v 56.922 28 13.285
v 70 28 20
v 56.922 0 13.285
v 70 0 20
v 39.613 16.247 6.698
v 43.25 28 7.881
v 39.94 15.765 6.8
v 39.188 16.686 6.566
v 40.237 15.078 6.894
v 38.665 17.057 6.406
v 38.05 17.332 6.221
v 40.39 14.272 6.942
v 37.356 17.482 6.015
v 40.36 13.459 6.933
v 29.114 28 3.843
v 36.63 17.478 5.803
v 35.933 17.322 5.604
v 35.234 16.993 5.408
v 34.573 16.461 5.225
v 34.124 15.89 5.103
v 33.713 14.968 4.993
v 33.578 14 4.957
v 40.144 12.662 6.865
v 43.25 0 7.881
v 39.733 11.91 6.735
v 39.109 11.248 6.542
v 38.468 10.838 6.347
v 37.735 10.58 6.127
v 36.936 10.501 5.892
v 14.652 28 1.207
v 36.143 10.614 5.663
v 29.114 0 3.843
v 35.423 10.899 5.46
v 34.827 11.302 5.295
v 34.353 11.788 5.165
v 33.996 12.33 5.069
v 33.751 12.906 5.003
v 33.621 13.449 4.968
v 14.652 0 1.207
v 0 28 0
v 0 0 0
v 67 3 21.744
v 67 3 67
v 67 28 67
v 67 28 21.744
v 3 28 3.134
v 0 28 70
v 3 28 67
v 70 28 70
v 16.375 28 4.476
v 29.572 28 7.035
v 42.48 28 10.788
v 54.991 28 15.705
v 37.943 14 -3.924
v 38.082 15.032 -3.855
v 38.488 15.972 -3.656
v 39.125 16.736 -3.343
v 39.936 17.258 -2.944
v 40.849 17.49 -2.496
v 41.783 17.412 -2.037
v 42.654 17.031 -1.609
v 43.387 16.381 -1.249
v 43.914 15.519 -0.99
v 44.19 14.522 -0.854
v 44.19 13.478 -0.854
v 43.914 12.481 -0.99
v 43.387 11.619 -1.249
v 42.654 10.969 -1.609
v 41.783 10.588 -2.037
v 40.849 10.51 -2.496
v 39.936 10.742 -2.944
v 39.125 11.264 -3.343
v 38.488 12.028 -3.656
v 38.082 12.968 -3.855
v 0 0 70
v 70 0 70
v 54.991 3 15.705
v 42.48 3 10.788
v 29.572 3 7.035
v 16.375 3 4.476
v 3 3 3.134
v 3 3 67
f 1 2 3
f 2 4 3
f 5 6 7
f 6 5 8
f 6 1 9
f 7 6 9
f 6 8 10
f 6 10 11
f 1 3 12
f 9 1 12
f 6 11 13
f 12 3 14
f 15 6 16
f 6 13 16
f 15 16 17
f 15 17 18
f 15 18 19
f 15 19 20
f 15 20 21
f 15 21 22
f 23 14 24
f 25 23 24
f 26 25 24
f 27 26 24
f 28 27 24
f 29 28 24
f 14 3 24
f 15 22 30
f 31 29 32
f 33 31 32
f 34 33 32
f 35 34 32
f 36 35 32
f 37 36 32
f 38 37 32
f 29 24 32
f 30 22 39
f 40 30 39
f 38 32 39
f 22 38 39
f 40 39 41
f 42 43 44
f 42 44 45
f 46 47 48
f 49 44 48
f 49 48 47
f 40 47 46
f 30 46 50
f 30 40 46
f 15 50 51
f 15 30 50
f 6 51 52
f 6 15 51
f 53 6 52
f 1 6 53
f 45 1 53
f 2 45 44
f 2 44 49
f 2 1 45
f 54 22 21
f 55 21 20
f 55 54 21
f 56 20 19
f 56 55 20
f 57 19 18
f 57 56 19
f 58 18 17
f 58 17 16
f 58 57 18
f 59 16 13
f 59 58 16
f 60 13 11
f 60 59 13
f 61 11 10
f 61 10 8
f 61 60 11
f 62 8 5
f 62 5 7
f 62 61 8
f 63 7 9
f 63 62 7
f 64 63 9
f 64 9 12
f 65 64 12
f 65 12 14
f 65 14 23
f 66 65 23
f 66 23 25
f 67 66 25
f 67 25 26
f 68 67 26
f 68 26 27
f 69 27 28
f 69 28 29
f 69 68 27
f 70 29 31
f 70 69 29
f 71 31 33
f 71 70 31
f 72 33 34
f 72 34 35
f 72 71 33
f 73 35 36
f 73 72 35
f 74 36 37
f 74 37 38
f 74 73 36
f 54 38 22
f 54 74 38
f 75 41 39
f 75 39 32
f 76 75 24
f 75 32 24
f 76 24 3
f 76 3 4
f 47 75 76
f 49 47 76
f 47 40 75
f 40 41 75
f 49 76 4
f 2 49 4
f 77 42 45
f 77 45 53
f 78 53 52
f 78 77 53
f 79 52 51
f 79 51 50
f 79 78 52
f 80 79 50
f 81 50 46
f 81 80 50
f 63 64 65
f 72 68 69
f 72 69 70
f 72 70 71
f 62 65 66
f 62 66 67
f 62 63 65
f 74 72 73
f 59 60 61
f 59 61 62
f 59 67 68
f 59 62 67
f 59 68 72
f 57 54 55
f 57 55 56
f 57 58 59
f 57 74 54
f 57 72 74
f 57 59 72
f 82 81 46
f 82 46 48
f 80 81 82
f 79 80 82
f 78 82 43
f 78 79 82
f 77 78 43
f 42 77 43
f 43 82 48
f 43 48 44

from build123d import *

# Parameters (mm, degrees)
BOSS_EXTRUDE2_DEPTH             = 3
BOSS_EXTRUDE3_DEPTH             = 25
SKETCH11_R                      = 3.5
BOSS_EXTRUDE5_DEPTH             = 7
BOSS_EXTRUDE5_DIRECTION_2_REACH = 85.256


with BuildPart() as part:
    # Sketch1 → Boss-Extrude2 (new body)
    with BuildSketch(Plane(origin=(0, 0, 0), x_dir=(1, 0, 0), z_dir=(0, 1, 0))):
        with BuildLine():
            Line((0, 0), (0, -70))
            Line((0, -70), (70, -70))
            Line((70, -70), (70, -20))
            ThreePointArc((70, -20), (36.231761047, -5.688836334), (0, 0))
        make_face()
    extrude(amount=BOSS_EXTRUDE2_DEPTH)

    # Sketch3 → Boss-Extrude3 (add)
    with BuildSketch(Plane(origin=(0, 3, 0), x_dir=(1, 0, 0), z_dir=(0, 1, 0))):
        with BuildLine():
            Line((70, -70), (70, -20))
            ThreePointArc((70, -20), (36.231761047, -5.688836334), (0, 0))
            Line((0, 0), (0, -70))
            Line((0, -70), (70, -70))
        make_face()
        with BuildLine():
            Line((3, -3.133993062), (3, -67))
            Line((3, -67), (67, -67))
            Line((67, -67), (67, -21.744121307))
            ThreePointArc((67, -21.744121307), (36.068657655, -8.763956776), (3, -3.133993062))
        make_face(mode=Mode.SUBTRACT)
    extrude(amount=BOSS_EXTRUDE3_DEPTH)

    # Sketch11 → Boss-Extrude5 (add)
    with BuildSketch(Plane(origin=(61.178699811, 14, 15.293872991), x_dir=(-0.8974903699241337, 0, -0.4410340529862085), z_dir=(0.4410340529862085, 0, -0.8974903699241337))):
        with Locations((25.829909239, 0)):
            Circle(SKETCH11_R)
    extrude(amount=BOSS_EXTRUDE5_DEPTH)

    # Sketch11 → Boss-Extrude5 direction 2 (add, up to next)
    with BuildSketch(Plane(origin=(61.178699811, 14, 15.293872991), x_dir=(-0.8974903699241337, 0, -0.4410340529862085), z_dir=(0.4410340529862085, 0, -0.8974903699241337)), mode=Mode.PRIVATE) as boss_extrude5_direction_2_sk1:
        with Locations((25.829909239, 0)):
            Circle(SKETCH11_R)
    boss_extrude5_direction_2_tool1 = extrude(boss_extrude5_direction_2_sk1.sketch, amount=-BOSS_EXTRUDE5_DIRECTION_2_REACH, mode=Mode.PRIVATE) - part.part
    add(boss_extrude5_direction_2_tool1.solids().sort_by_distance((37.996605, 14, 3.902003))[0])


solid = part.part
